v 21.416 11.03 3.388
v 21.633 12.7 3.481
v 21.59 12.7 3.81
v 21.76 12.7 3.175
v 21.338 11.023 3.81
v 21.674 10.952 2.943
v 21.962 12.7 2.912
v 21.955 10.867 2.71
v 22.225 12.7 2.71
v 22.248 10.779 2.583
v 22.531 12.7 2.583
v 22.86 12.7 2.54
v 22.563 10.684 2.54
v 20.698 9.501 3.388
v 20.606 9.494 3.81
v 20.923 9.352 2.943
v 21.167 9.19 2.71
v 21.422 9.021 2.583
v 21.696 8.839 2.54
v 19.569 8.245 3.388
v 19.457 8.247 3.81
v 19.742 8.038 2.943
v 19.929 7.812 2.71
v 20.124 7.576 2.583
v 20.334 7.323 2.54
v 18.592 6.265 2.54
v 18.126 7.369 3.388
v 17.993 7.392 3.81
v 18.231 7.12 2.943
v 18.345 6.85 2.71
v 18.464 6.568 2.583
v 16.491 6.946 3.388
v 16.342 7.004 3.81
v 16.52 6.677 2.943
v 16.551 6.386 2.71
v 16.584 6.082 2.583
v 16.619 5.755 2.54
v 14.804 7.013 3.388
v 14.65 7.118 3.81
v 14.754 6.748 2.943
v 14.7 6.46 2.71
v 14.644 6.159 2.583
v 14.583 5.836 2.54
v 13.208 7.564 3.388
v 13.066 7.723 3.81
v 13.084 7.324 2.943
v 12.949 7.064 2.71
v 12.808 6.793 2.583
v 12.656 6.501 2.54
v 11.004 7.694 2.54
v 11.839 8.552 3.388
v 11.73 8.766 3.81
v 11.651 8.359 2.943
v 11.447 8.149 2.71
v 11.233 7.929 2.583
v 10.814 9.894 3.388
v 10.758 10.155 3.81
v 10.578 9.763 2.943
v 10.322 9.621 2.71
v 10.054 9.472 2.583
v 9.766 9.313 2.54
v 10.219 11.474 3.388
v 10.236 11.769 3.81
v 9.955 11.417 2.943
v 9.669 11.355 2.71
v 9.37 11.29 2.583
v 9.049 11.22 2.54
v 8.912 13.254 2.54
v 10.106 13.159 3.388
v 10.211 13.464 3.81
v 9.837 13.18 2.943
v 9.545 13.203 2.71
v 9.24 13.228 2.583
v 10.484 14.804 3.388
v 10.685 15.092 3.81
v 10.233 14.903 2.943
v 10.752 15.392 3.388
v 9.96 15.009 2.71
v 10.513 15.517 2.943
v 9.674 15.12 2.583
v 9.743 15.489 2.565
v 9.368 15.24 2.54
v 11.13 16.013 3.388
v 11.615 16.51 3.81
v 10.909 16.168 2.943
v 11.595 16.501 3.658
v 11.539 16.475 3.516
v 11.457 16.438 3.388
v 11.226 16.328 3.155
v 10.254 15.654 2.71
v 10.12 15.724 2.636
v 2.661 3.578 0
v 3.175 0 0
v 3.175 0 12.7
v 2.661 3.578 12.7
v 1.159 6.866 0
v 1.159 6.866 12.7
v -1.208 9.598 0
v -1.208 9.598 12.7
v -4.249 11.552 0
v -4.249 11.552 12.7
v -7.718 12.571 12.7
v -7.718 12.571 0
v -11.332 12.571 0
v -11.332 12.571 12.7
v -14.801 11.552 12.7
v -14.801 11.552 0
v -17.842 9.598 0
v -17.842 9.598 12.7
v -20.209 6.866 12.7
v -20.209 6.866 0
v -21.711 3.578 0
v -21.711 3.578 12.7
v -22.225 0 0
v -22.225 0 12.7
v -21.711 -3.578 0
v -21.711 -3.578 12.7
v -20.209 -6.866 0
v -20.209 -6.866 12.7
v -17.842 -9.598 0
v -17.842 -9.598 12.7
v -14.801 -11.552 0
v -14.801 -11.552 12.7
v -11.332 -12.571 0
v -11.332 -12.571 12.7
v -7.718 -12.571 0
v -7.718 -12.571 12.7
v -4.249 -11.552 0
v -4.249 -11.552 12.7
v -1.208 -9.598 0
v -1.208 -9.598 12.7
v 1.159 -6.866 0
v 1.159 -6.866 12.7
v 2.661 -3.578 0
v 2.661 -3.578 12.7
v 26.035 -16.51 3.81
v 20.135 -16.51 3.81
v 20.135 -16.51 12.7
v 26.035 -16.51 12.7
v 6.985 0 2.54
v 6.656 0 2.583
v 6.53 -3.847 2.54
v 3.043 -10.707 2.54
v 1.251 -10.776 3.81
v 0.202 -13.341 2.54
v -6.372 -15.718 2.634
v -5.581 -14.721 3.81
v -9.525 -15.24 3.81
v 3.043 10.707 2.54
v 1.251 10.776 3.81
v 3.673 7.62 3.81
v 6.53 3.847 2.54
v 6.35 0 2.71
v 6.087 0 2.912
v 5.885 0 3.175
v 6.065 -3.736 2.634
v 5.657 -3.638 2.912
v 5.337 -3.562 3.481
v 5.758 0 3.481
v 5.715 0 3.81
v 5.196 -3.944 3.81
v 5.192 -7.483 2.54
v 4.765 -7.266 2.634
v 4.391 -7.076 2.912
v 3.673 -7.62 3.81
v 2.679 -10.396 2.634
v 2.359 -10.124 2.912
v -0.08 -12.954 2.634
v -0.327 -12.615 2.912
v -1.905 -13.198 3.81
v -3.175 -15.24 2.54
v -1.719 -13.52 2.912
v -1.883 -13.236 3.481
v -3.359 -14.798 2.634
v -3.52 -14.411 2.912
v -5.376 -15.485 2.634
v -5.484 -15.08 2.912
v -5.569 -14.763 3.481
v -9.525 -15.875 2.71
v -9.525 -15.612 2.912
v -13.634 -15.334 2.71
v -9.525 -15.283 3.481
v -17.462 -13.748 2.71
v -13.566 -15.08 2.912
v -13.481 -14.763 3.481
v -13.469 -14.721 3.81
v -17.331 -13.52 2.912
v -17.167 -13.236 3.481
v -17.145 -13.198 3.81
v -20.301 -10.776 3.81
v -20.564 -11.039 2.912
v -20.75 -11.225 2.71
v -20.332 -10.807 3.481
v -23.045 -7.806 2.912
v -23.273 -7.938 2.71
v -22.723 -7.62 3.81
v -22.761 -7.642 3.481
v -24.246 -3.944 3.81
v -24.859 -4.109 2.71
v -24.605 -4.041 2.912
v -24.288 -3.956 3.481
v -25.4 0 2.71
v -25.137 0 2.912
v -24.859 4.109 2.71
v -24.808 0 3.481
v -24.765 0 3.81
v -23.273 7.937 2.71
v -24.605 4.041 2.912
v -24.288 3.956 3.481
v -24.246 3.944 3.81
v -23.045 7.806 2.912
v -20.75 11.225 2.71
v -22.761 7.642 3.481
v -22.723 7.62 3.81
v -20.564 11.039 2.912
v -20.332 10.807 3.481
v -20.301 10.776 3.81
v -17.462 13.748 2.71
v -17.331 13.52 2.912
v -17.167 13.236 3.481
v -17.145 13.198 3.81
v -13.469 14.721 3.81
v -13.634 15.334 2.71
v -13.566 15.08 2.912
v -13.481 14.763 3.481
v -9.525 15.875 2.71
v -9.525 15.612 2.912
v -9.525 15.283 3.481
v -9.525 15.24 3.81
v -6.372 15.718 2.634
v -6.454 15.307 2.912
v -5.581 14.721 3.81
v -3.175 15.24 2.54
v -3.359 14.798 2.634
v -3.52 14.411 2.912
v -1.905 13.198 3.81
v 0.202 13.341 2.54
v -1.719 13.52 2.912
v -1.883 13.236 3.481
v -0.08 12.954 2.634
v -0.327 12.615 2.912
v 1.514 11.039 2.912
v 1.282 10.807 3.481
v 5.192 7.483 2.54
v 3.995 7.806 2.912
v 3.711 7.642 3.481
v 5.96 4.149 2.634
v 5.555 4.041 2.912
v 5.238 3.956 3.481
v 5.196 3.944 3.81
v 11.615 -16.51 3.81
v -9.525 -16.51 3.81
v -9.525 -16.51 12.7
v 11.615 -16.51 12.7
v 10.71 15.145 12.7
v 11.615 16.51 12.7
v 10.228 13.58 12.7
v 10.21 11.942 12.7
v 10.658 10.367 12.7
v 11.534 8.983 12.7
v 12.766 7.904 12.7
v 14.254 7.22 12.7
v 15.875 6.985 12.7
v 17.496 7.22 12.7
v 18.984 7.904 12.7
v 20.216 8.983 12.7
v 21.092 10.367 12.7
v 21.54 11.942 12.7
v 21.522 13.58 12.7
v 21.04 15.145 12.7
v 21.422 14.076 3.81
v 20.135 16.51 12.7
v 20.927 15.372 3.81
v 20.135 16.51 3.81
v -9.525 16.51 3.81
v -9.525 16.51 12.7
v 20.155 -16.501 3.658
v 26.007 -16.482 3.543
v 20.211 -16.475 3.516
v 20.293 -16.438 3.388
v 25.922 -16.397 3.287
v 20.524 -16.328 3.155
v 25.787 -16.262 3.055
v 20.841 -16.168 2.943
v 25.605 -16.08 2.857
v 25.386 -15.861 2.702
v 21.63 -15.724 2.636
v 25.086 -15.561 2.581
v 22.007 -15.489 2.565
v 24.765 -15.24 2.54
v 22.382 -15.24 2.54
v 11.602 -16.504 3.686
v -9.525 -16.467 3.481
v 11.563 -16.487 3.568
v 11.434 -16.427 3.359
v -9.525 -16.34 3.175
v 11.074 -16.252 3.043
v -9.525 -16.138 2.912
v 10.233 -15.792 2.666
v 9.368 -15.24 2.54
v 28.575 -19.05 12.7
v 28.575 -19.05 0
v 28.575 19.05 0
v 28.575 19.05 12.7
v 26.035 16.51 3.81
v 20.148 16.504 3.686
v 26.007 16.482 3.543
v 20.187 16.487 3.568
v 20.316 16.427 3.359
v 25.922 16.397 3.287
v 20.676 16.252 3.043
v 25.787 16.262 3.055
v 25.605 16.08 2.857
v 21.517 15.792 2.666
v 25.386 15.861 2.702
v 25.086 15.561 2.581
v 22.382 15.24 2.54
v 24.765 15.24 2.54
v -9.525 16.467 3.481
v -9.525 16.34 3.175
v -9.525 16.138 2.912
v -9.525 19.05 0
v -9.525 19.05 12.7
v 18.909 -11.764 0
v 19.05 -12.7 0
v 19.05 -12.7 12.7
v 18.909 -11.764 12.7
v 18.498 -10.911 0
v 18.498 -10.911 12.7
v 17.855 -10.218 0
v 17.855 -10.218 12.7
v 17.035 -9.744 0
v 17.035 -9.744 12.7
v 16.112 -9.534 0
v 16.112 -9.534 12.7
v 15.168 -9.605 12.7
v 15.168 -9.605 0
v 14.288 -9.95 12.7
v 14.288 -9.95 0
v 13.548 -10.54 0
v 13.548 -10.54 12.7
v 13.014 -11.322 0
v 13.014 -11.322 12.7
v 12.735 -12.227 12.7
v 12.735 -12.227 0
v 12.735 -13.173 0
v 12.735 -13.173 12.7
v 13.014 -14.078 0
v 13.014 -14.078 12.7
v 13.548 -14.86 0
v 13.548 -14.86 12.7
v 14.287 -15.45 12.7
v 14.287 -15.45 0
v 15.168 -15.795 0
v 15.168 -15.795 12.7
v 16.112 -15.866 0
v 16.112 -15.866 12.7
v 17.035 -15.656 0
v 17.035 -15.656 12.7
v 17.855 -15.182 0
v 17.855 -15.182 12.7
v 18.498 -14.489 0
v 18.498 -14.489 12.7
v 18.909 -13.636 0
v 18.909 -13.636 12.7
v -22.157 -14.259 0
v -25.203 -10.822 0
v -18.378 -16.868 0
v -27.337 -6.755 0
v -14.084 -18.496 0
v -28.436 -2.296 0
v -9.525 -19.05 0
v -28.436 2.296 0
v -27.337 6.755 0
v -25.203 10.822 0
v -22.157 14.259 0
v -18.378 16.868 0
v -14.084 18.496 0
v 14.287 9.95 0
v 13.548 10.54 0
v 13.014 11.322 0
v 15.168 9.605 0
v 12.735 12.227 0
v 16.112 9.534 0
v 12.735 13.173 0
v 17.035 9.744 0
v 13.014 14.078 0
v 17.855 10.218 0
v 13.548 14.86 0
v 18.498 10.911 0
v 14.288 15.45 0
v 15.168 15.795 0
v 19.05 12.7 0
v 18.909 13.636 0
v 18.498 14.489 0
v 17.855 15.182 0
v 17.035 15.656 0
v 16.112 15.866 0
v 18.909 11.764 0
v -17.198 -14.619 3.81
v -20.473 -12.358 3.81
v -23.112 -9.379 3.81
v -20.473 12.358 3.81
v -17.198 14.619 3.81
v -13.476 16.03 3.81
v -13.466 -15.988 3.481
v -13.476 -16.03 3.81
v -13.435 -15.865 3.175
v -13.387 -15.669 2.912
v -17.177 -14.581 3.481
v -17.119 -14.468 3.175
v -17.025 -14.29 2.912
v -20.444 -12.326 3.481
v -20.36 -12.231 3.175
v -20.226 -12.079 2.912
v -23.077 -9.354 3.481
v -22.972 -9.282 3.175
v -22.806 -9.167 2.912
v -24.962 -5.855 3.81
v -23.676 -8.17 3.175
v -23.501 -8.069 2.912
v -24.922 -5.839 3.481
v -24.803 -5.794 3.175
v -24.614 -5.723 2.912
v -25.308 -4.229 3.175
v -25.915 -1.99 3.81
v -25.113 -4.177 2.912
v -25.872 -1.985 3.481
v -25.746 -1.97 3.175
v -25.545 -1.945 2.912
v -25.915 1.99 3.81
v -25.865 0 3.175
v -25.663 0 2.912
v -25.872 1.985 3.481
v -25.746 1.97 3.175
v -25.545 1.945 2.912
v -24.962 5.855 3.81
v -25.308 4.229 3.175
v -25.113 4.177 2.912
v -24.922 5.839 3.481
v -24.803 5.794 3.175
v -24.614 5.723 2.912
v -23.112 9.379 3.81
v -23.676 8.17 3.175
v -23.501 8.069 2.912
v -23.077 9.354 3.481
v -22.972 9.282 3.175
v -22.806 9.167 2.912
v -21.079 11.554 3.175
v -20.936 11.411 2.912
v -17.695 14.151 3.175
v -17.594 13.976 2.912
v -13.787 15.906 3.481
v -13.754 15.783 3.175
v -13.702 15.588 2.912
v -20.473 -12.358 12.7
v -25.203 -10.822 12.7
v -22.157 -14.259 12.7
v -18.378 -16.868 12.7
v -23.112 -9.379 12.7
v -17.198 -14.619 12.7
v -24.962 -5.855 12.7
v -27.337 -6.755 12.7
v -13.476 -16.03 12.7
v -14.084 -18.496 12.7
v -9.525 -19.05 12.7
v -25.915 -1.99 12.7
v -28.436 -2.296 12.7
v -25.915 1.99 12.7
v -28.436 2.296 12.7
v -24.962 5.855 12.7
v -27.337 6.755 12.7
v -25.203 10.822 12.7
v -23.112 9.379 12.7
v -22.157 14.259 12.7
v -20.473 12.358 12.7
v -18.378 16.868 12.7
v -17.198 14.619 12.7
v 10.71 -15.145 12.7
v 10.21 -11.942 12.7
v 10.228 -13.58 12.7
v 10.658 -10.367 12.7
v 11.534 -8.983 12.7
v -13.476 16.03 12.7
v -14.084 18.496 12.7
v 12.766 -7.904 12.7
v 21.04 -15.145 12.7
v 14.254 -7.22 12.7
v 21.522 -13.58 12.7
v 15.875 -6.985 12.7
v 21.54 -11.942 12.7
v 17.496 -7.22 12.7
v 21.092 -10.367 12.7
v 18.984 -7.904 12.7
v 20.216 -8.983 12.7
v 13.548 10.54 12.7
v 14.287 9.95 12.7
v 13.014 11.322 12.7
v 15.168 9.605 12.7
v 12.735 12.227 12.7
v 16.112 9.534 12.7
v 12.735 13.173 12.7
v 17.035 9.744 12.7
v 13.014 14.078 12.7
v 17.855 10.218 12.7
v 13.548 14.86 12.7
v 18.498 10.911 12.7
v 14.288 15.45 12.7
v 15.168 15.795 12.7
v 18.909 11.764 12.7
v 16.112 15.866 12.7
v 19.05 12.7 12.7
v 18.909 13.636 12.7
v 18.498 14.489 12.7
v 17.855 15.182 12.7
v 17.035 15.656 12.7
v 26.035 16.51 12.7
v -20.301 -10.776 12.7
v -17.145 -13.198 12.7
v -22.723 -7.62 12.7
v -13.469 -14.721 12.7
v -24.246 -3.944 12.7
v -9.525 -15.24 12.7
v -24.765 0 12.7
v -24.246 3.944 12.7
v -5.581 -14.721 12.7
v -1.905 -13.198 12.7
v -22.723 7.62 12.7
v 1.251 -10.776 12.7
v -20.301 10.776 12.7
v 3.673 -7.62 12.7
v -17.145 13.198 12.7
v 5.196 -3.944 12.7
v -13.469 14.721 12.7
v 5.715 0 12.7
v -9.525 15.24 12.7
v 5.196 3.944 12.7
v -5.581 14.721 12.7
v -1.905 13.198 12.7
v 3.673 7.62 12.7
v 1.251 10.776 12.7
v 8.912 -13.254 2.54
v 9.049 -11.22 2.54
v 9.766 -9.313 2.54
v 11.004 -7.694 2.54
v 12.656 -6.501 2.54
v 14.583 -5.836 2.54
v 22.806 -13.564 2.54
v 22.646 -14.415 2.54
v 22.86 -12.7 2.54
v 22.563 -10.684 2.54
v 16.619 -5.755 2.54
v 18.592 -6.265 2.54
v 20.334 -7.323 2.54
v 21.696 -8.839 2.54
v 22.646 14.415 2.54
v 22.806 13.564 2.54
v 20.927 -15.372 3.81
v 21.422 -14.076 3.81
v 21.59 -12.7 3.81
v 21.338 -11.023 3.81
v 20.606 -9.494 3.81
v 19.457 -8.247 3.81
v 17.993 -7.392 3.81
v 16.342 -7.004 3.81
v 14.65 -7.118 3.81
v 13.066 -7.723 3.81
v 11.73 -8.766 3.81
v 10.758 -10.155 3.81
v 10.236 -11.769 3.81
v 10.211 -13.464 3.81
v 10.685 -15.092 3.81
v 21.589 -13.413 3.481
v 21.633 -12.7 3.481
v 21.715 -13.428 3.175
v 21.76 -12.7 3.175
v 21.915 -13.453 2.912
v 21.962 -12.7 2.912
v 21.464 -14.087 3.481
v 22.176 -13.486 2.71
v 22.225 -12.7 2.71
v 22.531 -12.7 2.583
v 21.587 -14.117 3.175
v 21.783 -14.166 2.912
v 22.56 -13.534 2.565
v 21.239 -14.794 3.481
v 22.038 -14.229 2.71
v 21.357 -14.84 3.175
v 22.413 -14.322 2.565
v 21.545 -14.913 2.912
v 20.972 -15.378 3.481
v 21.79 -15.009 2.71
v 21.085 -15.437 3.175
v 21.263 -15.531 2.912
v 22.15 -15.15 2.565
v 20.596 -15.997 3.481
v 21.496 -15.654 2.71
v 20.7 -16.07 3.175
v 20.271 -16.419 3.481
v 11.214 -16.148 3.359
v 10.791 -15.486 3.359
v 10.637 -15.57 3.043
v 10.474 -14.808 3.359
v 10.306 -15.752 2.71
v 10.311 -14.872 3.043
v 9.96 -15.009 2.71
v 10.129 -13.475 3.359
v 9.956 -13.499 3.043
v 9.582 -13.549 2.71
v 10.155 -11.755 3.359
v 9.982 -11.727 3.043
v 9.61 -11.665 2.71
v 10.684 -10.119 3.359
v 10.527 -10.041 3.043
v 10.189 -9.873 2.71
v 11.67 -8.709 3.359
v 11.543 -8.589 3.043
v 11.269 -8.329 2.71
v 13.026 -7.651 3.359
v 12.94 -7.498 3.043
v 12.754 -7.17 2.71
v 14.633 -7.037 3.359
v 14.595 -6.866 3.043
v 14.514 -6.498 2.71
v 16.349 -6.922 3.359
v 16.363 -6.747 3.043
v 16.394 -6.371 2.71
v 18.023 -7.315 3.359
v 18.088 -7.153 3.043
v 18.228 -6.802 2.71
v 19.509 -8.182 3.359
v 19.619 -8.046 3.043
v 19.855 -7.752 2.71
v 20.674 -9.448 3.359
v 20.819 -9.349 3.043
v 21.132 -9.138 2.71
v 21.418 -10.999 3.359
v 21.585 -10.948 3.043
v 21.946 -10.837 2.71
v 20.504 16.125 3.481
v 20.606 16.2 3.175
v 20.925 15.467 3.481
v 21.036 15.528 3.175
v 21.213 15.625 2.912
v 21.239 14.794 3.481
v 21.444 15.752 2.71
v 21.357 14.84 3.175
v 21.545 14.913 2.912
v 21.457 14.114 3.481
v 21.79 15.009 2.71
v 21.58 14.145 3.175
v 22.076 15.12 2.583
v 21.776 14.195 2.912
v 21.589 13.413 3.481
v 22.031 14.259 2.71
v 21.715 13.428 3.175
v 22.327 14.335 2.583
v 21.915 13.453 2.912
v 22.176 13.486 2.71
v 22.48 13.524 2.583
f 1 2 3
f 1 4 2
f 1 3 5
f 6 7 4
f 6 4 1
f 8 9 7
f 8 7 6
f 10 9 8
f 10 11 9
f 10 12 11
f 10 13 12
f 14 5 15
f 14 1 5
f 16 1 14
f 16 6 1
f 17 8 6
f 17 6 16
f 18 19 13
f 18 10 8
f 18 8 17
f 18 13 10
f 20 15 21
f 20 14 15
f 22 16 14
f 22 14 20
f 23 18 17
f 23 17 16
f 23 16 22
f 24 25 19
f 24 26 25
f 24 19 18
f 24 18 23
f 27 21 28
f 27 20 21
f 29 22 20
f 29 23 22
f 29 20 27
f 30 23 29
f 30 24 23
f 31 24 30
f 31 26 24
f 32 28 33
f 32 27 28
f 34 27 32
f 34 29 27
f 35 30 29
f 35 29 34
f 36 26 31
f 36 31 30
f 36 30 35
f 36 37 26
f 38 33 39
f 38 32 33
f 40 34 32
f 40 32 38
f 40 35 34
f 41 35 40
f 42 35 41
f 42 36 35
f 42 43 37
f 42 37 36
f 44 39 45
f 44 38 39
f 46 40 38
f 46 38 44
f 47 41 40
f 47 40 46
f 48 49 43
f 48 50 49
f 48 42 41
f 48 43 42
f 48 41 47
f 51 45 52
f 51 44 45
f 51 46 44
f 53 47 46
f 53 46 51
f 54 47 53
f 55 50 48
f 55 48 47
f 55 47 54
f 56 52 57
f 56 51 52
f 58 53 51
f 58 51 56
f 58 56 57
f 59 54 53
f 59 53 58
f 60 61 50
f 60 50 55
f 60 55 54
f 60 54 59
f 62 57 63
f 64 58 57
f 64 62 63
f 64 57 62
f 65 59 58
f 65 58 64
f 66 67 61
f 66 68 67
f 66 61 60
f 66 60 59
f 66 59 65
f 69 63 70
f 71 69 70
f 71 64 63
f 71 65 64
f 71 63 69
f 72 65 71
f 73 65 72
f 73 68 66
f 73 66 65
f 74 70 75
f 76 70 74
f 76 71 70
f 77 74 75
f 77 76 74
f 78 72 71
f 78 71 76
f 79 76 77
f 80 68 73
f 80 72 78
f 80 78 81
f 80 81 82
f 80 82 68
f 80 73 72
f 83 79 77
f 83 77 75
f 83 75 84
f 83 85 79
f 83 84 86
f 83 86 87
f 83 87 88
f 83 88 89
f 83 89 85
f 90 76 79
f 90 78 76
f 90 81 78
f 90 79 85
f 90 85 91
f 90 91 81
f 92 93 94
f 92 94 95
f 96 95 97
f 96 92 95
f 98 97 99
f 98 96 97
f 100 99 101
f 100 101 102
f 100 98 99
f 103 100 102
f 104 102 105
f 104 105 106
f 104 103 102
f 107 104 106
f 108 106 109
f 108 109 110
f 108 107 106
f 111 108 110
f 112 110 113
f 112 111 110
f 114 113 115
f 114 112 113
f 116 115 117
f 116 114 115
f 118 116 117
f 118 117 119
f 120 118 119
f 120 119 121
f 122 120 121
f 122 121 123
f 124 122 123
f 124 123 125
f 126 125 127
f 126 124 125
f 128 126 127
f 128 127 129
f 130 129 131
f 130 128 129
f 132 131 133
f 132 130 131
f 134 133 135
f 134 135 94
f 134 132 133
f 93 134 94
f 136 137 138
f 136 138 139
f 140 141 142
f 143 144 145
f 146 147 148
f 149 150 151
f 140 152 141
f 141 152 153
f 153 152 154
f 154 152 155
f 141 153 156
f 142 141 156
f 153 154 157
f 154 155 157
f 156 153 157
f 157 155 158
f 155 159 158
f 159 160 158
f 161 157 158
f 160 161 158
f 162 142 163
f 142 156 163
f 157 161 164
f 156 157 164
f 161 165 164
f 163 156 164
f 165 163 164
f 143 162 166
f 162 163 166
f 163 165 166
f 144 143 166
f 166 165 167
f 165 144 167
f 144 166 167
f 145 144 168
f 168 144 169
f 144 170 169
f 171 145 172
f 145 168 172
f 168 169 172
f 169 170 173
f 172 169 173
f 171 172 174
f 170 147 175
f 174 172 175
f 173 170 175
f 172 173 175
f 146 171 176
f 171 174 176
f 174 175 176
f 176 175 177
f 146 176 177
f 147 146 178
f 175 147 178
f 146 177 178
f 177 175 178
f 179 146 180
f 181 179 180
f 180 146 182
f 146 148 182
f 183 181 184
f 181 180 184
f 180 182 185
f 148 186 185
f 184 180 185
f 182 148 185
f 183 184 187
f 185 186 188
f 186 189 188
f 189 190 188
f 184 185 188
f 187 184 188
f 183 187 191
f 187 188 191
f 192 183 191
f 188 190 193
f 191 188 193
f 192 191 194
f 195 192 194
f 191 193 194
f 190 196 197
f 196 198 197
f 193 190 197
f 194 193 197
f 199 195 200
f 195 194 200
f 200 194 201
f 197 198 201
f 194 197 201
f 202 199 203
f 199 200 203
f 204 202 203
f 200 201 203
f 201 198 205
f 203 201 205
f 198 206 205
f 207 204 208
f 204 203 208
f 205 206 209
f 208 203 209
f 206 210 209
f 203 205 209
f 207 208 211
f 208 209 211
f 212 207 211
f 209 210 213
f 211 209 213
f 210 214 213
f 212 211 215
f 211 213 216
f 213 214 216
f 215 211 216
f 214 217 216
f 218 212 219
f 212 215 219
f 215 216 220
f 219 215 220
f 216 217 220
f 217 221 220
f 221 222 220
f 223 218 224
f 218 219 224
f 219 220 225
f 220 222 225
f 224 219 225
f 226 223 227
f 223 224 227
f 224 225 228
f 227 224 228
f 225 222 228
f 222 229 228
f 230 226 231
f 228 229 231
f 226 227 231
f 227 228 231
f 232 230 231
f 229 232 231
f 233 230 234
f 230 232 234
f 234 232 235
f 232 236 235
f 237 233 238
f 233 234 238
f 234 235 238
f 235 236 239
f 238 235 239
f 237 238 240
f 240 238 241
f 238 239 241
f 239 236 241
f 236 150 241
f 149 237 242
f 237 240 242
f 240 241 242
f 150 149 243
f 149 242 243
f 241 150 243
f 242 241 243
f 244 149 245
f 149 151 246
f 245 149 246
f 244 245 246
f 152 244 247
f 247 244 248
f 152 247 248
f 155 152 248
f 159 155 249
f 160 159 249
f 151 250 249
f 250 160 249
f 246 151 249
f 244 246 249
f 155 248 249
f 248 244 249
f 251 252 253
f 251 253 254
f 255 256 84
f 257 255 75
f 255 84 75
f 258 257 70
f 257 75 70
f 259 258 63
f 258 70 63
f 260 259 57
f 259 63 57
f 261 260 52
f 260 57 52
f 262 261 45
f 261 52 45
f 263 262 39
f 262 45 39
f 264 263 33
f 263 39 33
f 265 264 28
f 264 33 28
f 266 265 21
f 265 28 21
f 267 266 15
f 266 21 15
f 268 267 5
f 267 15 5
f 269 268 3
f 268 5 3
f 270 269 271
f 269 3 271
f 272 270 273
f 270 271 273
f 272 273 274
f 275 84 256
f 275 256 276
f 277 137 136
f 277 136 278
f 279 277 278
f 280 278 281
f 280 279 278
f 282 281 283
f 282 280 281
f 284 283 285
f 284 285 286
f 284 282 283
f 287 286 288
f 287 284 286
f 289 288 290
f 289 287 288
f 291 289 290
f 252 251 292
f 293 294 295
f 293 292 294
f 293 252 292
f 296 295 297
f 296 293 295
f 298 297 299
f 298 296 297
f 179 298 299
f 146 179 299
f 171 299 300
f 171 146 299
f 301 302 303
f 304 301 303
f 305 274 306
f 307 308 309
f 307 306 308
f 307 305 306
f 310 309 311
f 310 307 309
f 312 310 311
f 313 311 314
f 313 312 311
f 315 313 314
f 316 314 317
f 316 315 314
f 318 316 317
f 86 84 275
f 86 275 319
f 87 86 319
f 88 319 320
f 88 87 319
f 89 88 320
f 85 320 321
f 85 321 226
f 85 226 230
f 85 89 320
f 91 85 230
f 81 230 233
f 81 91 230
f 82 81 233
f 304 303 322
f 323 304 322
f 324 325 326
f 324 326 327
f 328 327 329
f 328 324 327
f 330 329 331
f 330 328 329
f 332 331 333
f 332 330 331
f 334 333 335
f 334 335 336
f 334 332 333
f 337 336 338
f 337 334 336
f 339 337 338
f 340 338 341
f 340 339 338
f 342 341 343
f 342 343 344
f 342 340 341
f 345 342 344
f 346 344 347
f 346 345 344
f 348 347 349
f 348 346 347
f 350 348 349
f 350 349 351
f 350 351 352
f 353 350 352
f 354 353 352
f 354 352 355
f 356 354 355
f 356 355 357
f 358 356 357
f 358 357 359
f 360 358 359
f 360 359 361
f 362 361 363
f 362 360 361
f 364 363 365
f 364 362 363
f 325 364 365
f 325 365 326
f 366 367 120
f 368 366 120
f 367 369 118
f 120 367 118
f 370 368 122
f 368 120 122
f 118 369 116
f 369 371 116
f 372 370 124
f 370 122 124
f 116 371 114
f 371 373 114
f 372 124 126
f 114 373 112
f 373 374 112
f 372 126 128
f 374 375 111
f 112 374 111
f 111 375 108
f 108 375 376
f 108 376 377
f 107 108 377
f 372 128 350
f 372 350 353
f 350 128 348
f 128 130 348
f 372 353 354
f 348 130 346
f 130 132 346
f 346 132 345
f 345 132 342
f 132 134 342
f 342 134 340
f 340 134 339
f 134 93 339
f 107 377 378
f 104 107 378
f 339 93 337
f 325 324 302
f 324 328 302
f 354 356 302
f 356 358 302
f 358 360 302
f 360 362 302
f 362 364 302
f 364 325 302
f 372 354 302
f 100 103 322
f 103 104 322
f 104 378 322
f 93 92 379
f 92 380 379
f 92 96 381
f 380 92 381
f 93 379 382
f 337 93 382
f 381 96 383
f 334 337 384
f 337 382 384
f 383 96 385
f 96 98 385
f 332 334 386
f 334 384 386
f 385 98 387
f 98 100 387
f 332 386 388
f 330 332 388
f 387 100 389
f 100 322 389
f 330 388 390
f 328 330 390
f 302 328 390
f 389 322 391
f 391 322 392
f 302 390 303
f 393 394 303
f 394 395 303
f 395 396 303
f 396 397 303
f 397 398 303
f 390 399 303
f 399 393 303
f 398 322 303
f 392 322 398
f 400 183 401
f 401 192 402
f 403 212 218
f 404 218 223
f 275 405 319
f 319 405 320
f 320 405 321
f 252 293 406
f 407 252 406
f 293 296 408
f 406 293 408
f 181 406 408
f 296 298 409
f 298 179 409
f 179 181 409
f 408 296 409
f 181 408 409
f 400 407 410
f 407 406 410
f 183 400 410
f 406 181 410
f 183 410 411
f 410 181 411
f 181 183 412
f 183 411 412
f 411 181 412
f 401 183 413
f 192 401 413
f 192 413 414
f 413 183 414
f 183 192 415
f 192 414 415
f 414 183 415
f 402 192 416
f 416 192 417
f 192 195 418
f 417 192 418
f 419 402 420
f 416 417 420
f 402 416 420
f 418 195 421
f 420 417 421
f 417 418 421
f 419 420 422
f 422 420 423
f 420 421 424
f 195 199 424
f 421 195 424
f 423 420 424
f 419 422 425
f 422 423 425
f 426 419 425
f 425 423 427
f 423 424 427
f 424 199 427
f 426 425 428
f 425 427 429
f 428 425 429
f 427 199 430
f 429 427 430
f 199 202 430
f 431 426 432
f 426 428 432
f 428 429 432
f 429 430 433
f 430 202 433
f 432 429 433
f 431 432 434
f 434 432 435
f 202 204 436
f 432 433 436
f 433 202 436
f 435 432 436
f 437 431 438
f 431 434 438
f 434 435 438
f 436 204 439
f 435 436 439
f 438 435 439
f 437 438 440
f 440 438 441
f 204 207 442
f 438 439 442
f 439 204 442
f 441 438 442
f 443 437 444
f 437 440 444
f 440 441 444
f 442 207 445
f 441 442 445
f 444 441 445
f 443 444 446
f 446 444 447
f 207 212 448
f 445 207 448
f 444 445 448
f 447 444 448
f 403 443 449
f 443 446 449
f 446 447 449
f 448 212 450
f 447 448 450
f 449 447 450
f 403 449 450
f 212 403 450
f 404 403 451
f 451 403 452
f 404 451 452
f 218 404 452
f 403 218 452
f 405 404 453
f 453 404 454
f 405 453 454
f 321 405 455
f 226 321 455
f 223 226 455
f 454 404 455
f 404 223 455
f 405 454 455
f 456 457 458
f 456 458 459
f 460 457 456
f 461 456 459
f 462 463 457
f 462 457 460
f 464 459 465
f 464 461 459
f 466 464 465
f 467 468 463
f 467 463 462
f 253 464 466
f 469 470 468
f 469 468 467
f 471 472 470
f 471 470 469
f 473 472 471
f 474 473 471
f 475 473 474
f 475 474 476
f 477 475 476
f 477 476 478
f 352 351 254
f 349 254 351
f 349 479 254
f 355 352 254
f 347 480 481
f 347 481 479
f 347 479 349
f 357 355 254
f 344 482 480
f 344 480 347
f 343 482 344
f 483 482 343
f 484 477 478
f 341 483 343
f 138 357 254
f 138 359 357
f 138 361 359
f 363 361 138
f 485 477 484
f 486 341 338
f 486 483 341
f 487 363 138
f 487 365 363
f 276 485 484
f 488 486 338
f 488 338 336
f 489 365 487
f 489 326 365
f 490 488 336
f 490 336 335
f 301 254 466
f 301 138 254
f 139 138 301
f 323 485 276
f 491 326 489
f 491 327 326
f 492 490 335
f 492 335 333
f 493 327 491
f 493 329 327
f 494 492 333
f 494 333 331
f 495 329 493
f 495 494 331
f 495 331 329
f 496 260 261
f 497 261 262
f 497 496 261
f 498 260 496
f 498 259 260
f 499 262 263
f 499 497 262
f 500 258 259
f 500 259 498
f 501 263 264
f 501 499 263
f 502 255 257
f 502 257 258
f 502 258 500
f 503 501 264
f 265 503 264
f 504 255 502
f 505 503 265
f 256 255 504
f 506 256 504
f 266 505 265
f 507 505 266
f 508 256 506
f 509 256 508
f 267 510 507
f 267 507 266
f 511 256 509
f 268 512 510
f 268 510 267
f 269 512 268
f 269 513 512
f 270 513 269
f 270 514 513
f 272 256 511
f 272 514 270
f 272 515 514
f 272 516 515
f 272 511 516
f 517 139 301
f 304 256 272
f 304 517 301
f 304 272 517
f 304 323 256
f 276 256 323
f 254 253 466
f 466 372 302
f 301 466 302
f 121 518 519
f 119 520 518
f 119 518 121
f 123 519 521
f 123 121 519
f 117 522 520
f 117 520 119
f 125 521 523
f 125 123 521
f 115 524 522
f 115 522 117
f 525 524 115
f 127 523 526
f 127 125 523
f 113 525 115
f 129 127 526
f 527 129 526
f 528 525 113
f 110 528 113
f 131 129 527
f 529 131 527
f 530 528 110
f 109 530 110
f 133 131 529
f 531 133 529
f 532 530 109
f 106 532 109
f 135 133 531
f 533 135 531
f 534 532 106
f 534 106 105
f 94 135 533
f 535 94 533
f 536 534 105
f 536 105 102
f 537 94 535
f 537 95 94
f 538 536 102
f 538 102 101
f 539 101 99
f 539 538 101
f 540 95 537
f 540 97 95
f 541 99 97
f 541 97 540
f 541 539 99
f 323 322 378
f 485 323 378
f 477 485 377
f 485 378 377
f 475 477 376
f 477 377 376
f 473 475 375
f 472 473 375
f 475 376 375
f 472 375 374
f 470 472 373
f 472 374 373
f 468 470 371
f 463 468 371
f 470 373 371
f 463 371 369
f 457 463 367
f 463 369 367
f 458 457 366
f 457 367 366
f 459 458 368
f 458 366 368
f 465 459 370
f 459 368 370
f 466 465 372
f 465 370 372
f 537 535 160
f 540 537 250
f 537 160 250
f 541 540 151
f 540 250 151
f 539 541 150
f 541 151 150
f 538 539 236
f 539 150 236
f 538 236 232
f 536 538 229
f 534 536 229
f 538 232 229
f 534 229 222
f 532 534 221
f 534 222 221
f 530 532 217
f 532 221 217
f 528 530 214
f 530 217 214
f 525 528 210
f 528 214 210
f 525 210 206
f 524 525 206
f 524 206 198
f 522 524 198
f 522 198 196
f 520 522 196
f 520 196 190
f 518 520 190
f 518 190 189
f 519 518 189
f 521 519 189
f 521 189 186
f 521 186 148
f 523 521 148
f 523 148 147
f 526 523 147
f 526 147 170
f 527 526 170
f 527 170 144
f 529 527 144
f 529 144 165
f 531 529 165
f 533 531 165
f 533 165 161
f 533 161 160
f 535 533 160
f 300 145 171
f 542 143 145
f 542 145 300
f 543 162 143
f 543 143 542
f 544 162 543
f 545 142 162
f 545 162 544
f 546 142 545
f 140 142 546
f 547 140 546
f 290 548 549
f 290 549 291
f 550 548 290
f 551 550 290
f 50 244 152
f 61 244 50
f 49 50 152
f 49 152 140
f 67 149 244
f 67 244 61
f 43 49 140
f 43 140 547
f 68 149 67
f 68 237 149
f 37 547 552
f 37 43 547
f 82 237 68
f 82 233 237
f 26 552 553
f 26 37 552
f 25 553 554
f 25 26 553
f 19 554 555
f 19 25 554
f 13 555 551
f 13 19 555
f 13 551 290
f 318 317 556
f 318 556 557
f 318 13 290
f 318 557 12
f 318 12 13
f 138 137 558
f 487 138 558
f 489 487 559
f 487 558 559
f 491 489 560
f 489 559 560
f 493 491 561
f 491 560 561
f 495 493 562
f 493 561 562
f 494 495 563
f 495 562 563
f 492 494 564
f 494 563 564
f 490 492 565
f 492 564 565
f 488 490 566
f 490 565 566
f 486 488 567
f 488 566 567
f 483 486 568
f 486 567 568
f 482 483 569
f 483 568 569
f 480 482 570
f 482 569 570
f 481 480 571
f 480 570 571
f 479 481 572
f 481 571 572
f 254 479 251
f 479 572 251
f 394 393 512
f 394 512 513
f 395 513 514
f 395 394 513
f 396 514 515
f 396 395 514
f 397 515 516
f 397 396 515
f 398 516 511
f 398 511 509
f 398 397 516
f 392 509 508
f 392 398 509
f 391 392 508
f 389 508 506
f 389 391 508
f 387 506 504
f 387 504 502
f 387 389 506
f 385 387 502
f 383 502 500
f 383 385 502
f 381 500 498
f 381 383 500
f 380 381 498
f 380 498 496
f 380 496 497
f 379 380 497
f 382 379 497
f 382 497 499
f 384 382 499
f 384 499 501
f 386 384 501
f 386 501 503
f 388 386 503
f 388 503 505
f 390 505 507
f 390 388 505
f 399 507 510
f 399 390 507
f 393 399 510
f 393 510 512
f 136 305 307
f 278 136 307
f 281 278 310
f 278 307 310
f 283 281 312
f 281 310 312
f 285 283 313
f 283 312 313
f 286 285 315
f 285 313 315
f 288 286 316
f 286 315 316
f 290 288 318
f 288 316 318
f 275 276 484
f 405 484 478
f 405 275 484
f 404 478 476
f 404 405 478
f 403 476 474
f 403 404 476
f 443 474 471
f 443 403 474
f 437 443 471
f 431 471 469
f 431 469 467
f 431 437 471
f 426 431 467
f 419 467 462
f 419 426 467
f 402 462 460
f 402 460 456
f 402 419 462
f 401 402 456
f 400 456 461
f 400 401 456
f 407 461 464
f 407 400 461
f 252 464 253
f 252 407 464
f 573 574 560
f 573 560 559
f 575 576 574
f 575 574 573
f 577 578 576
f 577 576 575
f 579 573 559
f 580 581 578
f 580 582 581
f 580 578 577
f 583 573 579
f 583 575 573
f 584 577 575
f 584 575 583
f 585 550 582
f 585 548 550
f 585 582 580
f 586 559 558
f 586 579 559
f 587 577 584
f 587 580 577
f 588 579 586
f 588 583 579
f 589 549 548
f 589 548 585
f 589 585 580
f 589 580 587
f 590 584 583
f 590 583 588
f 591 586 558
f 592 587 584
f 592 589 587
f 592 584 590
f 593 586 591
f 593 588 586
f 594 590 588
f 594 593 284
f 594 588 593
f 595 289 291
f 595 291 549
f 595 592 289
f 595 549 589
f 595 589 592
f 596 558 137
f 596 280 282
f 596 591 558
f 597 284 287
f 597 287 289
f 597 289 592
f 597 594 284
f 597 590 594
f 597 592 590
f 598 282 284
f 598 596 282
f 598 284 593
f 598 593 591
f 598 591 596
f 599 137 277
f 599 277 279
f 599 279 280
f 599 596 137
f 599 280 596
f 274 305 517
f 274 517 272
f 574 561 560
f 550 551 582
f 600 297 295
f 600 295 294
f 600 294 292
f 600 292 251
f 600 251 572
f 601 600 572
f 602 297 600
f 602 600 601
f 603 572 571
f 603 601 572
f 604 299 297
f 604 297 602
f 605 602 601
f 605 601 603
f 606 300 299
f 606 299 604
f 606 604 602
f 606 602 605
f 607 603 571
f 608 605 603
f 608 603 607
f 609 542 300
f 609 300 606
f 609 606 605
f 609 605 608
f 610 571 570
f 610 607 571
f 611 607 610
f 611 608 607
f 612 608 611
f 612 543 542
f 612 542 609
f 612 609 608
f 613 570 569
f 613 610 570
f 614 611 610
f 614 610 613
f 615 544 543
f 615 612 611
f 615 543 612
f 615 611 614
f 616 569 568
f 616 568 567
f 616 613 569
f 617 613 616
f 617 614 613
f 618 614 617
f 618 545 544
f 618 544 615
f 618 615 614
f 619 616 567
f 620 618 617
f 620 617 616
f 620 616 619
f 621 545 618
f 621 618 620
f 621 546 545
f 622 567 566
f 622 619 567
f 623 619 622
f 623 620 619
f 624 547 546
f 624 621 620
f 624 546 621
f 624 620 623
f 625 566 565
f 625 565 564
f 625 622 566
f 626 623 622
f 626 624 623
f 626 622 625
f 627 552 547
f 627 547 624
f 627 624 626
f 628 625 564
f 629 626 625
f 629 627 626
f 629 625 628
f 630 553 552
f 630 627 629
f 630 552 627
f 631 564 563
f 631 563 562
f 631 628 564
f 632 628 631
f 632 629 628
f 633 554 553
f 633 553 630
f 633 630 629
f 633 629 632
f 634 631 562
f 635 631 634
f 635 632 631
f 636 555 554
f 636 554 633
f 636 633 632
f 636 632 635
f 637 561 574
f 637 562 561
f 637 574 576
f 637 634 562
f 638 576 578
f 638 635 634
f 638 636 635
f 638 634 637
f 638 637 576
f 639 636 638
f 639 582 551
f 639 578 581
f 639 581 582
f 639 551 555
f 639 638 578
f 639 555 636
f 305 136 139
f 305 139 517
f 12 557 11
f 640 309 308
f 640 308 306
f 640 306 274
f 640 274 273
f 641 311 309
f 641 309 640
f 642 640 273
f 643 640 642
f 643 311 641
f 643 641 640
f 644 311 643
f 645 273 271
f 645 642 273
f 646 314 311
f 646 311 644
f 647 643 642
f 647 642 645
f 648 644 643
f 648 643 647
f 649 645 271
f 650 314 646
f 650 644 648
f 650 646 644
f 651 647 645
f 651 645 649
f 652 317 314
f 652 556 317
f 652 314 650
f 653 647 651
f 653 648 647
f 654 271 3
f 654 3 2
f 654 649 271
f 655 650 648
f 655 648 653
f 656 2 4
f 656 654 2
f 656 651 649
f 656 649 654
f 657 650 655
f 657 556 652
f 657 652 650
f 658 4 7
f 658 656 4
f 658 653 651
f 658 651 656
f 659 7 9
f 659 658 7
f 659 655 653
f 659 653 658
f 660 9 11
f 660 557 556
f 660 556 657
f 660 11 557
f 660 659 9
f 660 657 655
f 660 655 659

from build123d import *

# Parameters (mm, degrees)
F0_R         = 3.175
F0_R_2       = 12.7
F1_DEPTH     = 12.7
F2_T         = -2.54
F3_T1_DEPTH  = 33.02
F3_T6_DEPTH  = 24.3152905029
F3_S7_R      = 5.715
F3_T8_DEPTH  = 14
F3_T12_ANGLE = 253.7190819507
F3_T17_ANGLE = 73.6440624835
F3_T22_DEPTH = 9.0752905029
F3_S23_R     = 5.715
F3_T24_DEPTH = 6
F3_T28_DEPTH = 9.0752905029
F3_S29_R     = 5.715
F3_T30_DEPTH = 6
F3_T34_ANGLE = 73.6440624835
F3_T39_ANGLE = 253.7190819507
F3_T44_DEPTH = 24.3152905029
F3_S45_R     = 5.715
F3_T46_DEPTH = 14
F3_T48_ANGLE = 180


# Not quite as in the source:
# - a fillet or chamfer that OpenCascade refuses, or shapes differently, is made with other operations: its cross-section is extruded or revolved along the edge and cut away or added


with BuildPart() as f1:
    # F0 (on Top) → F1 (new body)
    with BuildSketch(Plane.XY):
        with BuildLine():
            Line((28.575, -19.05), (28.575, 19.05))
            Line((28.575, 19.05), (-9.525, 19.05))
            ThreePointArc((-9.525, 19.05), (-28.575, 0), (-9.525, -19.05))
            Line((-9.525, -19.05), (28.575, -19.05))
        make_face()
        with Locations((15.875, -12.7)):
            Circle(F0_R, mode=Mode.SUBTRACT)
        with Locations((-9.525, 0)):
            Circle(F0_R_2, mode=Mode.SUBTRACT)
        with Locations((15.875, 12.7)):
            Circle(F0_R, mode=Mode.SUBTRACT)
    extrude(amount=F1_DEPTH)

    # F2
    f2_openings = [f1.faces().sort_by_distance(p)[0] for p in [
        (5.241716, 0, 12.7),
    ]]
    offset(amount=F2_T, openings=f2_openings)

    # F3: fillet of radius 1.27 on 11 edges, made by hand

    # F3_s2 → F3_t1 (join)
    with BuildSketch(Plane.XZ.offset(-16.51)):
        with BuildLine():
            ThreePointArc((26.035, 3.81), (25.6630256121, 2.9119743879), (24.765, 2.54))
            Line((24.765, 2.54), (26.035, 2.54))
            Line((26.035, 2.54), (26.035, 3.81))
        make_face()
    extrude(amount=F3_T1_DEPTH)


with BuildPart() as f3_tool4:
    # F3_s5 → F3_t6 (new body)
    with BuildSketch(Plane.YZ.offset(-9.525)):
        with BuildLine():
            ThreePointArc((-16.51, 3.81), (-16.1380256121, 2.9119743879), (-15.24, 2.54))
            Line((-15.24, 2.54), (-16.51, 2.54))
            Line((-16.51, 2.54), (-16.51, 3.81))
        make_face()
    extrude(amount=F3_T6_DEPTH)

    # F3_s7 → F3_t8 (cut, symmetric)
    with BuildSketch(Plane.XY.offset(3.2)):
        with Locations((15.875, -12.7)):
            Circle(F3_S7_R)
    extrude(amount=F3_T8_DEPTH, both=True, mode=Mode.SUBTRACT)


with BuildPart() as f1_1:
    add(f1.part)

    # F3_t3: union F3_tool4
    add(f3_tool4.part)


with BuildPart() as f3_tool10:
    # F3_s11 → F3_t12 (revolve)
    with BuildSketch(Plane(origin=(18.0449433807, -5.2701877221, 0), x_dir=(0, 0, 1), z_dir=(0.9598987128, -0.2803470371, 0))):
        with BuildLine():
            ThreePointArc((3.81, 13.4552044392), (2.9119743879, 13.8271788271), (2.54, 14.7252044392))
            Line((2.54, 14.7252044392), (2.54, 13.4552044392))
            Line((2.54, 13.4552044392), (3.81, 13.4552044392))
        make_face()
    revolve(axis=Axis((15.875, -12.7, 2.54), (0, 0, -1)), revolution_arc=F3_T12_ANGLE)

    split(bisect_by=Plane.XZ.offset(16.51), keep=Keep.BOTTOM)


with BuildPart() as f1_2:
    add(f1_1.part)

    # F3_t9: union F3_tool10
    add(f3_tool10.part)


with BuildPart() as f3_tool15:
    # F3_s16 → F3_t17 (revolve)
    with BuildSketch(Plane.XZ.offset(12.7)):
        with BuildLine():
            ThreePointArc((21.59, 3.81), (21.9619743879, 2.9119743879), (22.86, 2.54))
            Line((22.86, 2.54), (21.59, 2.54))
            Line((21.59, 2.54), (21.59, 3.81))
        make_face()
    revolve(axis=Axis((15.875, -12.7, 2.54), (0, 0, -1)), revolution_arc=F3_T17_ANGLE)

    split(bisect_by=Plane.XZ.offset(16.51), keep=Keep.BOTTOM)


with BuildPart() as f1_3:
    add(f1_2.part)

    # F3_t14: union F3_tool15
    add(f3_tool15.part)


with BuildPart() as f3_tool20:
    # F3_s21 → F3_t22 (new body)
    with BuildSketch(Plane.YZ.offset(16.9597094971)):
        with BuildLine():
            ThreePointArc((-16.51, 3.81), (-16.1380256121, 2.9119743879), (-15.24, 2.54))
            Line((-15.24, 2.54), (-16.51, 2.54))
            Line((-16.51, 2.54), (-16.51, 3.81))
        make_face()
    extrude(amount=F3_T22_DEPTH)

    # F3_s23 → F3_t24 (cut, symmetric)
    with BuildSketch(Plane.XY.offset(3.2)):
        with Locations((15.875, -12.7)):
            Circle(F3_S23_R)
    extrude(amount=F3_T24_DEPTH, both=True, mode=Mode.SUBTRACT)


with BuildPart() as f1_4:
    add(f1_3.part)

    # F3_t19: union F3_tool20
    add(f3_tool20.part)


with BuildPart() as f3_tool26:
    # F3_s27 → F3_t28 (new body)
    with BuildSketch(Plane.YZ.offset(26.035)):
        with BuildLine():
            ThreePointArc((16.51, 3.81), (16.1380256121, 2.9119743879), (15.24, 2.54))
            Line((15.24, 2.54), (16.51, 2.54))
            Line((16.51, 2.54), (16.51, 3.81))
        make_face()
    extrude(amount=-F3_T28_DEPTH)

    # F3_s29 → F3_t30 (cut, symmetric)
    with BuildSketch(Plane.XY.offset(3.2)):
        with Locations((15.875, 12.7)):
            Circle(F3_S29_R)
    extrude(amount=F3_T30_DEPTH, both=True, mode=Mode.SUBTRACT)


with BuildPart() as f1_5:
    add(f1_4.part)

    # F3_t25: union F3_tool26
    add(f3_tool26.part)


with BuildPart() as f3_tool32:
    # F3_s33 → F3_t34 (revolve)
    with BuildSketch(Plane(origin=(11.1844694654, -3.2824241778, 0), x_dir=(0, 0, 1), z_dir=(-0.9595308214, 0.281603627, 0))):
        with BuildLine():
            ThreePointArc((3.81, 22.3714990108), (2.9119743879, 22.7434733987), (2.54, 23.6414990108))
            Line((2.54, 23.6414990108), (2.54, 22.3714990108))
            Line((2.54, 22.3714990108), (3.81, 22.3714990108))
        make_face()
    revolve(axis=Axis((15.875, 12.7, 2.54), (0, 0, -1)), revolution_arc=F3_T34_ANGLE)

    split(bisect_by=Plane.XZ.offset(-16.51), keep=Keep.TOP)


with BuildPart() as f1_6:
    add(f1_5.part)

    # F3_t31: union F3_tool32
    add(f3_tool32.part)


with BuildPart() as f3_tool37:
    # F3_s38 → F3_t39 (revolve)
    with BuildSketch(Plane.XZ.offset(-12.7)):
        with BuildLine():
            ThreePointArc((21.59, 3.81), (21.9619743879, 2.9119743879), (22.86, 2.54))
            Line((22.86, 2.54), (21.59, 2.54))
            Line((21.59, 2.54), (21.59, 3.81))
        make_face()
    revolve(axis=Axis((15.875, 12.7, 2.54), (0, 0, -1)), revolution_arc=F3_T39_ANGLE)

    split(bisect_by=Plane.XZ.offset(-16.51), keep=Keep.TOP)


with BuildPart() as f1_7:
    add(f1_6.part)

    # F3_t36: union F3_tool37
    add(f3_tool37.part)


with BuildPart() as f3_tool42:
    # F3_s43 → F3_t44 (new body)
    with BuildSketch(Plane.YZ.offset(14.7902905029)):
        with BuildLine():
            ThreePointArc((16.51, 3.81), (16.1380256121, 2.9119743879), (15.24, 2.54))
            Line((15.24, 2.54), (16.51, 2.54))
            Line((16.51, 2.54), (16.51, 3.81))
        make_face()
    extrude(amount=-F3_T44_DEPTH)

    # F3_s45 → F3_t46 (cut, symmetric)
    with BuildSketch(Plane.XY.offset(3.2)):
        with Locations((15.875, 12.7)):
            Circle(F3_S45_R)
    extrude(amount=F3_T46_DEPTH, both=True, mode=Mode.SUBTRACT)


with BuildPart() as f1_8:
    add(f1_7.part)

    # F3_t41: union F3_tool42
    add(f3_tool42.part)

    # F3_s47 → F3_t48 (revolve)
    with BuildSketch(Plane.YZ.offset(-9.525)):
        with BuildLine():
            ThreePointArc((-16.51, 3.81), (-16.1380256121, 2.9119743879), (-15.24, 2.54))
            Line((-15.24, 2.54), (-16.51, 2.54))
            Line((-16.51, 2.54), (-16.51, 3.81))
        make_face()
    revolve(axis=Axis((-9.525, 0, 2.54), (0, 0, -1)), revolution_arc=F3_T48_ANGLE)

    # F3_s49 → F3_t50 (revolve)
    with BuildSketch(Plane.XZ):
        with BuildLine():
            ThreePointArc((6.985, 2.54), (6.0869743879, 2.9119743879), (5.715, 3.81))
            Line((5.715, 3.81), (5.715, 2.54))
            Line((5.715, 2.54), (6.985, 2.54))
        make_face()
    revolve(axis=Axis((-9.525, 0, 2.54), (0, 0, -1)))


solid = f1_8.part
